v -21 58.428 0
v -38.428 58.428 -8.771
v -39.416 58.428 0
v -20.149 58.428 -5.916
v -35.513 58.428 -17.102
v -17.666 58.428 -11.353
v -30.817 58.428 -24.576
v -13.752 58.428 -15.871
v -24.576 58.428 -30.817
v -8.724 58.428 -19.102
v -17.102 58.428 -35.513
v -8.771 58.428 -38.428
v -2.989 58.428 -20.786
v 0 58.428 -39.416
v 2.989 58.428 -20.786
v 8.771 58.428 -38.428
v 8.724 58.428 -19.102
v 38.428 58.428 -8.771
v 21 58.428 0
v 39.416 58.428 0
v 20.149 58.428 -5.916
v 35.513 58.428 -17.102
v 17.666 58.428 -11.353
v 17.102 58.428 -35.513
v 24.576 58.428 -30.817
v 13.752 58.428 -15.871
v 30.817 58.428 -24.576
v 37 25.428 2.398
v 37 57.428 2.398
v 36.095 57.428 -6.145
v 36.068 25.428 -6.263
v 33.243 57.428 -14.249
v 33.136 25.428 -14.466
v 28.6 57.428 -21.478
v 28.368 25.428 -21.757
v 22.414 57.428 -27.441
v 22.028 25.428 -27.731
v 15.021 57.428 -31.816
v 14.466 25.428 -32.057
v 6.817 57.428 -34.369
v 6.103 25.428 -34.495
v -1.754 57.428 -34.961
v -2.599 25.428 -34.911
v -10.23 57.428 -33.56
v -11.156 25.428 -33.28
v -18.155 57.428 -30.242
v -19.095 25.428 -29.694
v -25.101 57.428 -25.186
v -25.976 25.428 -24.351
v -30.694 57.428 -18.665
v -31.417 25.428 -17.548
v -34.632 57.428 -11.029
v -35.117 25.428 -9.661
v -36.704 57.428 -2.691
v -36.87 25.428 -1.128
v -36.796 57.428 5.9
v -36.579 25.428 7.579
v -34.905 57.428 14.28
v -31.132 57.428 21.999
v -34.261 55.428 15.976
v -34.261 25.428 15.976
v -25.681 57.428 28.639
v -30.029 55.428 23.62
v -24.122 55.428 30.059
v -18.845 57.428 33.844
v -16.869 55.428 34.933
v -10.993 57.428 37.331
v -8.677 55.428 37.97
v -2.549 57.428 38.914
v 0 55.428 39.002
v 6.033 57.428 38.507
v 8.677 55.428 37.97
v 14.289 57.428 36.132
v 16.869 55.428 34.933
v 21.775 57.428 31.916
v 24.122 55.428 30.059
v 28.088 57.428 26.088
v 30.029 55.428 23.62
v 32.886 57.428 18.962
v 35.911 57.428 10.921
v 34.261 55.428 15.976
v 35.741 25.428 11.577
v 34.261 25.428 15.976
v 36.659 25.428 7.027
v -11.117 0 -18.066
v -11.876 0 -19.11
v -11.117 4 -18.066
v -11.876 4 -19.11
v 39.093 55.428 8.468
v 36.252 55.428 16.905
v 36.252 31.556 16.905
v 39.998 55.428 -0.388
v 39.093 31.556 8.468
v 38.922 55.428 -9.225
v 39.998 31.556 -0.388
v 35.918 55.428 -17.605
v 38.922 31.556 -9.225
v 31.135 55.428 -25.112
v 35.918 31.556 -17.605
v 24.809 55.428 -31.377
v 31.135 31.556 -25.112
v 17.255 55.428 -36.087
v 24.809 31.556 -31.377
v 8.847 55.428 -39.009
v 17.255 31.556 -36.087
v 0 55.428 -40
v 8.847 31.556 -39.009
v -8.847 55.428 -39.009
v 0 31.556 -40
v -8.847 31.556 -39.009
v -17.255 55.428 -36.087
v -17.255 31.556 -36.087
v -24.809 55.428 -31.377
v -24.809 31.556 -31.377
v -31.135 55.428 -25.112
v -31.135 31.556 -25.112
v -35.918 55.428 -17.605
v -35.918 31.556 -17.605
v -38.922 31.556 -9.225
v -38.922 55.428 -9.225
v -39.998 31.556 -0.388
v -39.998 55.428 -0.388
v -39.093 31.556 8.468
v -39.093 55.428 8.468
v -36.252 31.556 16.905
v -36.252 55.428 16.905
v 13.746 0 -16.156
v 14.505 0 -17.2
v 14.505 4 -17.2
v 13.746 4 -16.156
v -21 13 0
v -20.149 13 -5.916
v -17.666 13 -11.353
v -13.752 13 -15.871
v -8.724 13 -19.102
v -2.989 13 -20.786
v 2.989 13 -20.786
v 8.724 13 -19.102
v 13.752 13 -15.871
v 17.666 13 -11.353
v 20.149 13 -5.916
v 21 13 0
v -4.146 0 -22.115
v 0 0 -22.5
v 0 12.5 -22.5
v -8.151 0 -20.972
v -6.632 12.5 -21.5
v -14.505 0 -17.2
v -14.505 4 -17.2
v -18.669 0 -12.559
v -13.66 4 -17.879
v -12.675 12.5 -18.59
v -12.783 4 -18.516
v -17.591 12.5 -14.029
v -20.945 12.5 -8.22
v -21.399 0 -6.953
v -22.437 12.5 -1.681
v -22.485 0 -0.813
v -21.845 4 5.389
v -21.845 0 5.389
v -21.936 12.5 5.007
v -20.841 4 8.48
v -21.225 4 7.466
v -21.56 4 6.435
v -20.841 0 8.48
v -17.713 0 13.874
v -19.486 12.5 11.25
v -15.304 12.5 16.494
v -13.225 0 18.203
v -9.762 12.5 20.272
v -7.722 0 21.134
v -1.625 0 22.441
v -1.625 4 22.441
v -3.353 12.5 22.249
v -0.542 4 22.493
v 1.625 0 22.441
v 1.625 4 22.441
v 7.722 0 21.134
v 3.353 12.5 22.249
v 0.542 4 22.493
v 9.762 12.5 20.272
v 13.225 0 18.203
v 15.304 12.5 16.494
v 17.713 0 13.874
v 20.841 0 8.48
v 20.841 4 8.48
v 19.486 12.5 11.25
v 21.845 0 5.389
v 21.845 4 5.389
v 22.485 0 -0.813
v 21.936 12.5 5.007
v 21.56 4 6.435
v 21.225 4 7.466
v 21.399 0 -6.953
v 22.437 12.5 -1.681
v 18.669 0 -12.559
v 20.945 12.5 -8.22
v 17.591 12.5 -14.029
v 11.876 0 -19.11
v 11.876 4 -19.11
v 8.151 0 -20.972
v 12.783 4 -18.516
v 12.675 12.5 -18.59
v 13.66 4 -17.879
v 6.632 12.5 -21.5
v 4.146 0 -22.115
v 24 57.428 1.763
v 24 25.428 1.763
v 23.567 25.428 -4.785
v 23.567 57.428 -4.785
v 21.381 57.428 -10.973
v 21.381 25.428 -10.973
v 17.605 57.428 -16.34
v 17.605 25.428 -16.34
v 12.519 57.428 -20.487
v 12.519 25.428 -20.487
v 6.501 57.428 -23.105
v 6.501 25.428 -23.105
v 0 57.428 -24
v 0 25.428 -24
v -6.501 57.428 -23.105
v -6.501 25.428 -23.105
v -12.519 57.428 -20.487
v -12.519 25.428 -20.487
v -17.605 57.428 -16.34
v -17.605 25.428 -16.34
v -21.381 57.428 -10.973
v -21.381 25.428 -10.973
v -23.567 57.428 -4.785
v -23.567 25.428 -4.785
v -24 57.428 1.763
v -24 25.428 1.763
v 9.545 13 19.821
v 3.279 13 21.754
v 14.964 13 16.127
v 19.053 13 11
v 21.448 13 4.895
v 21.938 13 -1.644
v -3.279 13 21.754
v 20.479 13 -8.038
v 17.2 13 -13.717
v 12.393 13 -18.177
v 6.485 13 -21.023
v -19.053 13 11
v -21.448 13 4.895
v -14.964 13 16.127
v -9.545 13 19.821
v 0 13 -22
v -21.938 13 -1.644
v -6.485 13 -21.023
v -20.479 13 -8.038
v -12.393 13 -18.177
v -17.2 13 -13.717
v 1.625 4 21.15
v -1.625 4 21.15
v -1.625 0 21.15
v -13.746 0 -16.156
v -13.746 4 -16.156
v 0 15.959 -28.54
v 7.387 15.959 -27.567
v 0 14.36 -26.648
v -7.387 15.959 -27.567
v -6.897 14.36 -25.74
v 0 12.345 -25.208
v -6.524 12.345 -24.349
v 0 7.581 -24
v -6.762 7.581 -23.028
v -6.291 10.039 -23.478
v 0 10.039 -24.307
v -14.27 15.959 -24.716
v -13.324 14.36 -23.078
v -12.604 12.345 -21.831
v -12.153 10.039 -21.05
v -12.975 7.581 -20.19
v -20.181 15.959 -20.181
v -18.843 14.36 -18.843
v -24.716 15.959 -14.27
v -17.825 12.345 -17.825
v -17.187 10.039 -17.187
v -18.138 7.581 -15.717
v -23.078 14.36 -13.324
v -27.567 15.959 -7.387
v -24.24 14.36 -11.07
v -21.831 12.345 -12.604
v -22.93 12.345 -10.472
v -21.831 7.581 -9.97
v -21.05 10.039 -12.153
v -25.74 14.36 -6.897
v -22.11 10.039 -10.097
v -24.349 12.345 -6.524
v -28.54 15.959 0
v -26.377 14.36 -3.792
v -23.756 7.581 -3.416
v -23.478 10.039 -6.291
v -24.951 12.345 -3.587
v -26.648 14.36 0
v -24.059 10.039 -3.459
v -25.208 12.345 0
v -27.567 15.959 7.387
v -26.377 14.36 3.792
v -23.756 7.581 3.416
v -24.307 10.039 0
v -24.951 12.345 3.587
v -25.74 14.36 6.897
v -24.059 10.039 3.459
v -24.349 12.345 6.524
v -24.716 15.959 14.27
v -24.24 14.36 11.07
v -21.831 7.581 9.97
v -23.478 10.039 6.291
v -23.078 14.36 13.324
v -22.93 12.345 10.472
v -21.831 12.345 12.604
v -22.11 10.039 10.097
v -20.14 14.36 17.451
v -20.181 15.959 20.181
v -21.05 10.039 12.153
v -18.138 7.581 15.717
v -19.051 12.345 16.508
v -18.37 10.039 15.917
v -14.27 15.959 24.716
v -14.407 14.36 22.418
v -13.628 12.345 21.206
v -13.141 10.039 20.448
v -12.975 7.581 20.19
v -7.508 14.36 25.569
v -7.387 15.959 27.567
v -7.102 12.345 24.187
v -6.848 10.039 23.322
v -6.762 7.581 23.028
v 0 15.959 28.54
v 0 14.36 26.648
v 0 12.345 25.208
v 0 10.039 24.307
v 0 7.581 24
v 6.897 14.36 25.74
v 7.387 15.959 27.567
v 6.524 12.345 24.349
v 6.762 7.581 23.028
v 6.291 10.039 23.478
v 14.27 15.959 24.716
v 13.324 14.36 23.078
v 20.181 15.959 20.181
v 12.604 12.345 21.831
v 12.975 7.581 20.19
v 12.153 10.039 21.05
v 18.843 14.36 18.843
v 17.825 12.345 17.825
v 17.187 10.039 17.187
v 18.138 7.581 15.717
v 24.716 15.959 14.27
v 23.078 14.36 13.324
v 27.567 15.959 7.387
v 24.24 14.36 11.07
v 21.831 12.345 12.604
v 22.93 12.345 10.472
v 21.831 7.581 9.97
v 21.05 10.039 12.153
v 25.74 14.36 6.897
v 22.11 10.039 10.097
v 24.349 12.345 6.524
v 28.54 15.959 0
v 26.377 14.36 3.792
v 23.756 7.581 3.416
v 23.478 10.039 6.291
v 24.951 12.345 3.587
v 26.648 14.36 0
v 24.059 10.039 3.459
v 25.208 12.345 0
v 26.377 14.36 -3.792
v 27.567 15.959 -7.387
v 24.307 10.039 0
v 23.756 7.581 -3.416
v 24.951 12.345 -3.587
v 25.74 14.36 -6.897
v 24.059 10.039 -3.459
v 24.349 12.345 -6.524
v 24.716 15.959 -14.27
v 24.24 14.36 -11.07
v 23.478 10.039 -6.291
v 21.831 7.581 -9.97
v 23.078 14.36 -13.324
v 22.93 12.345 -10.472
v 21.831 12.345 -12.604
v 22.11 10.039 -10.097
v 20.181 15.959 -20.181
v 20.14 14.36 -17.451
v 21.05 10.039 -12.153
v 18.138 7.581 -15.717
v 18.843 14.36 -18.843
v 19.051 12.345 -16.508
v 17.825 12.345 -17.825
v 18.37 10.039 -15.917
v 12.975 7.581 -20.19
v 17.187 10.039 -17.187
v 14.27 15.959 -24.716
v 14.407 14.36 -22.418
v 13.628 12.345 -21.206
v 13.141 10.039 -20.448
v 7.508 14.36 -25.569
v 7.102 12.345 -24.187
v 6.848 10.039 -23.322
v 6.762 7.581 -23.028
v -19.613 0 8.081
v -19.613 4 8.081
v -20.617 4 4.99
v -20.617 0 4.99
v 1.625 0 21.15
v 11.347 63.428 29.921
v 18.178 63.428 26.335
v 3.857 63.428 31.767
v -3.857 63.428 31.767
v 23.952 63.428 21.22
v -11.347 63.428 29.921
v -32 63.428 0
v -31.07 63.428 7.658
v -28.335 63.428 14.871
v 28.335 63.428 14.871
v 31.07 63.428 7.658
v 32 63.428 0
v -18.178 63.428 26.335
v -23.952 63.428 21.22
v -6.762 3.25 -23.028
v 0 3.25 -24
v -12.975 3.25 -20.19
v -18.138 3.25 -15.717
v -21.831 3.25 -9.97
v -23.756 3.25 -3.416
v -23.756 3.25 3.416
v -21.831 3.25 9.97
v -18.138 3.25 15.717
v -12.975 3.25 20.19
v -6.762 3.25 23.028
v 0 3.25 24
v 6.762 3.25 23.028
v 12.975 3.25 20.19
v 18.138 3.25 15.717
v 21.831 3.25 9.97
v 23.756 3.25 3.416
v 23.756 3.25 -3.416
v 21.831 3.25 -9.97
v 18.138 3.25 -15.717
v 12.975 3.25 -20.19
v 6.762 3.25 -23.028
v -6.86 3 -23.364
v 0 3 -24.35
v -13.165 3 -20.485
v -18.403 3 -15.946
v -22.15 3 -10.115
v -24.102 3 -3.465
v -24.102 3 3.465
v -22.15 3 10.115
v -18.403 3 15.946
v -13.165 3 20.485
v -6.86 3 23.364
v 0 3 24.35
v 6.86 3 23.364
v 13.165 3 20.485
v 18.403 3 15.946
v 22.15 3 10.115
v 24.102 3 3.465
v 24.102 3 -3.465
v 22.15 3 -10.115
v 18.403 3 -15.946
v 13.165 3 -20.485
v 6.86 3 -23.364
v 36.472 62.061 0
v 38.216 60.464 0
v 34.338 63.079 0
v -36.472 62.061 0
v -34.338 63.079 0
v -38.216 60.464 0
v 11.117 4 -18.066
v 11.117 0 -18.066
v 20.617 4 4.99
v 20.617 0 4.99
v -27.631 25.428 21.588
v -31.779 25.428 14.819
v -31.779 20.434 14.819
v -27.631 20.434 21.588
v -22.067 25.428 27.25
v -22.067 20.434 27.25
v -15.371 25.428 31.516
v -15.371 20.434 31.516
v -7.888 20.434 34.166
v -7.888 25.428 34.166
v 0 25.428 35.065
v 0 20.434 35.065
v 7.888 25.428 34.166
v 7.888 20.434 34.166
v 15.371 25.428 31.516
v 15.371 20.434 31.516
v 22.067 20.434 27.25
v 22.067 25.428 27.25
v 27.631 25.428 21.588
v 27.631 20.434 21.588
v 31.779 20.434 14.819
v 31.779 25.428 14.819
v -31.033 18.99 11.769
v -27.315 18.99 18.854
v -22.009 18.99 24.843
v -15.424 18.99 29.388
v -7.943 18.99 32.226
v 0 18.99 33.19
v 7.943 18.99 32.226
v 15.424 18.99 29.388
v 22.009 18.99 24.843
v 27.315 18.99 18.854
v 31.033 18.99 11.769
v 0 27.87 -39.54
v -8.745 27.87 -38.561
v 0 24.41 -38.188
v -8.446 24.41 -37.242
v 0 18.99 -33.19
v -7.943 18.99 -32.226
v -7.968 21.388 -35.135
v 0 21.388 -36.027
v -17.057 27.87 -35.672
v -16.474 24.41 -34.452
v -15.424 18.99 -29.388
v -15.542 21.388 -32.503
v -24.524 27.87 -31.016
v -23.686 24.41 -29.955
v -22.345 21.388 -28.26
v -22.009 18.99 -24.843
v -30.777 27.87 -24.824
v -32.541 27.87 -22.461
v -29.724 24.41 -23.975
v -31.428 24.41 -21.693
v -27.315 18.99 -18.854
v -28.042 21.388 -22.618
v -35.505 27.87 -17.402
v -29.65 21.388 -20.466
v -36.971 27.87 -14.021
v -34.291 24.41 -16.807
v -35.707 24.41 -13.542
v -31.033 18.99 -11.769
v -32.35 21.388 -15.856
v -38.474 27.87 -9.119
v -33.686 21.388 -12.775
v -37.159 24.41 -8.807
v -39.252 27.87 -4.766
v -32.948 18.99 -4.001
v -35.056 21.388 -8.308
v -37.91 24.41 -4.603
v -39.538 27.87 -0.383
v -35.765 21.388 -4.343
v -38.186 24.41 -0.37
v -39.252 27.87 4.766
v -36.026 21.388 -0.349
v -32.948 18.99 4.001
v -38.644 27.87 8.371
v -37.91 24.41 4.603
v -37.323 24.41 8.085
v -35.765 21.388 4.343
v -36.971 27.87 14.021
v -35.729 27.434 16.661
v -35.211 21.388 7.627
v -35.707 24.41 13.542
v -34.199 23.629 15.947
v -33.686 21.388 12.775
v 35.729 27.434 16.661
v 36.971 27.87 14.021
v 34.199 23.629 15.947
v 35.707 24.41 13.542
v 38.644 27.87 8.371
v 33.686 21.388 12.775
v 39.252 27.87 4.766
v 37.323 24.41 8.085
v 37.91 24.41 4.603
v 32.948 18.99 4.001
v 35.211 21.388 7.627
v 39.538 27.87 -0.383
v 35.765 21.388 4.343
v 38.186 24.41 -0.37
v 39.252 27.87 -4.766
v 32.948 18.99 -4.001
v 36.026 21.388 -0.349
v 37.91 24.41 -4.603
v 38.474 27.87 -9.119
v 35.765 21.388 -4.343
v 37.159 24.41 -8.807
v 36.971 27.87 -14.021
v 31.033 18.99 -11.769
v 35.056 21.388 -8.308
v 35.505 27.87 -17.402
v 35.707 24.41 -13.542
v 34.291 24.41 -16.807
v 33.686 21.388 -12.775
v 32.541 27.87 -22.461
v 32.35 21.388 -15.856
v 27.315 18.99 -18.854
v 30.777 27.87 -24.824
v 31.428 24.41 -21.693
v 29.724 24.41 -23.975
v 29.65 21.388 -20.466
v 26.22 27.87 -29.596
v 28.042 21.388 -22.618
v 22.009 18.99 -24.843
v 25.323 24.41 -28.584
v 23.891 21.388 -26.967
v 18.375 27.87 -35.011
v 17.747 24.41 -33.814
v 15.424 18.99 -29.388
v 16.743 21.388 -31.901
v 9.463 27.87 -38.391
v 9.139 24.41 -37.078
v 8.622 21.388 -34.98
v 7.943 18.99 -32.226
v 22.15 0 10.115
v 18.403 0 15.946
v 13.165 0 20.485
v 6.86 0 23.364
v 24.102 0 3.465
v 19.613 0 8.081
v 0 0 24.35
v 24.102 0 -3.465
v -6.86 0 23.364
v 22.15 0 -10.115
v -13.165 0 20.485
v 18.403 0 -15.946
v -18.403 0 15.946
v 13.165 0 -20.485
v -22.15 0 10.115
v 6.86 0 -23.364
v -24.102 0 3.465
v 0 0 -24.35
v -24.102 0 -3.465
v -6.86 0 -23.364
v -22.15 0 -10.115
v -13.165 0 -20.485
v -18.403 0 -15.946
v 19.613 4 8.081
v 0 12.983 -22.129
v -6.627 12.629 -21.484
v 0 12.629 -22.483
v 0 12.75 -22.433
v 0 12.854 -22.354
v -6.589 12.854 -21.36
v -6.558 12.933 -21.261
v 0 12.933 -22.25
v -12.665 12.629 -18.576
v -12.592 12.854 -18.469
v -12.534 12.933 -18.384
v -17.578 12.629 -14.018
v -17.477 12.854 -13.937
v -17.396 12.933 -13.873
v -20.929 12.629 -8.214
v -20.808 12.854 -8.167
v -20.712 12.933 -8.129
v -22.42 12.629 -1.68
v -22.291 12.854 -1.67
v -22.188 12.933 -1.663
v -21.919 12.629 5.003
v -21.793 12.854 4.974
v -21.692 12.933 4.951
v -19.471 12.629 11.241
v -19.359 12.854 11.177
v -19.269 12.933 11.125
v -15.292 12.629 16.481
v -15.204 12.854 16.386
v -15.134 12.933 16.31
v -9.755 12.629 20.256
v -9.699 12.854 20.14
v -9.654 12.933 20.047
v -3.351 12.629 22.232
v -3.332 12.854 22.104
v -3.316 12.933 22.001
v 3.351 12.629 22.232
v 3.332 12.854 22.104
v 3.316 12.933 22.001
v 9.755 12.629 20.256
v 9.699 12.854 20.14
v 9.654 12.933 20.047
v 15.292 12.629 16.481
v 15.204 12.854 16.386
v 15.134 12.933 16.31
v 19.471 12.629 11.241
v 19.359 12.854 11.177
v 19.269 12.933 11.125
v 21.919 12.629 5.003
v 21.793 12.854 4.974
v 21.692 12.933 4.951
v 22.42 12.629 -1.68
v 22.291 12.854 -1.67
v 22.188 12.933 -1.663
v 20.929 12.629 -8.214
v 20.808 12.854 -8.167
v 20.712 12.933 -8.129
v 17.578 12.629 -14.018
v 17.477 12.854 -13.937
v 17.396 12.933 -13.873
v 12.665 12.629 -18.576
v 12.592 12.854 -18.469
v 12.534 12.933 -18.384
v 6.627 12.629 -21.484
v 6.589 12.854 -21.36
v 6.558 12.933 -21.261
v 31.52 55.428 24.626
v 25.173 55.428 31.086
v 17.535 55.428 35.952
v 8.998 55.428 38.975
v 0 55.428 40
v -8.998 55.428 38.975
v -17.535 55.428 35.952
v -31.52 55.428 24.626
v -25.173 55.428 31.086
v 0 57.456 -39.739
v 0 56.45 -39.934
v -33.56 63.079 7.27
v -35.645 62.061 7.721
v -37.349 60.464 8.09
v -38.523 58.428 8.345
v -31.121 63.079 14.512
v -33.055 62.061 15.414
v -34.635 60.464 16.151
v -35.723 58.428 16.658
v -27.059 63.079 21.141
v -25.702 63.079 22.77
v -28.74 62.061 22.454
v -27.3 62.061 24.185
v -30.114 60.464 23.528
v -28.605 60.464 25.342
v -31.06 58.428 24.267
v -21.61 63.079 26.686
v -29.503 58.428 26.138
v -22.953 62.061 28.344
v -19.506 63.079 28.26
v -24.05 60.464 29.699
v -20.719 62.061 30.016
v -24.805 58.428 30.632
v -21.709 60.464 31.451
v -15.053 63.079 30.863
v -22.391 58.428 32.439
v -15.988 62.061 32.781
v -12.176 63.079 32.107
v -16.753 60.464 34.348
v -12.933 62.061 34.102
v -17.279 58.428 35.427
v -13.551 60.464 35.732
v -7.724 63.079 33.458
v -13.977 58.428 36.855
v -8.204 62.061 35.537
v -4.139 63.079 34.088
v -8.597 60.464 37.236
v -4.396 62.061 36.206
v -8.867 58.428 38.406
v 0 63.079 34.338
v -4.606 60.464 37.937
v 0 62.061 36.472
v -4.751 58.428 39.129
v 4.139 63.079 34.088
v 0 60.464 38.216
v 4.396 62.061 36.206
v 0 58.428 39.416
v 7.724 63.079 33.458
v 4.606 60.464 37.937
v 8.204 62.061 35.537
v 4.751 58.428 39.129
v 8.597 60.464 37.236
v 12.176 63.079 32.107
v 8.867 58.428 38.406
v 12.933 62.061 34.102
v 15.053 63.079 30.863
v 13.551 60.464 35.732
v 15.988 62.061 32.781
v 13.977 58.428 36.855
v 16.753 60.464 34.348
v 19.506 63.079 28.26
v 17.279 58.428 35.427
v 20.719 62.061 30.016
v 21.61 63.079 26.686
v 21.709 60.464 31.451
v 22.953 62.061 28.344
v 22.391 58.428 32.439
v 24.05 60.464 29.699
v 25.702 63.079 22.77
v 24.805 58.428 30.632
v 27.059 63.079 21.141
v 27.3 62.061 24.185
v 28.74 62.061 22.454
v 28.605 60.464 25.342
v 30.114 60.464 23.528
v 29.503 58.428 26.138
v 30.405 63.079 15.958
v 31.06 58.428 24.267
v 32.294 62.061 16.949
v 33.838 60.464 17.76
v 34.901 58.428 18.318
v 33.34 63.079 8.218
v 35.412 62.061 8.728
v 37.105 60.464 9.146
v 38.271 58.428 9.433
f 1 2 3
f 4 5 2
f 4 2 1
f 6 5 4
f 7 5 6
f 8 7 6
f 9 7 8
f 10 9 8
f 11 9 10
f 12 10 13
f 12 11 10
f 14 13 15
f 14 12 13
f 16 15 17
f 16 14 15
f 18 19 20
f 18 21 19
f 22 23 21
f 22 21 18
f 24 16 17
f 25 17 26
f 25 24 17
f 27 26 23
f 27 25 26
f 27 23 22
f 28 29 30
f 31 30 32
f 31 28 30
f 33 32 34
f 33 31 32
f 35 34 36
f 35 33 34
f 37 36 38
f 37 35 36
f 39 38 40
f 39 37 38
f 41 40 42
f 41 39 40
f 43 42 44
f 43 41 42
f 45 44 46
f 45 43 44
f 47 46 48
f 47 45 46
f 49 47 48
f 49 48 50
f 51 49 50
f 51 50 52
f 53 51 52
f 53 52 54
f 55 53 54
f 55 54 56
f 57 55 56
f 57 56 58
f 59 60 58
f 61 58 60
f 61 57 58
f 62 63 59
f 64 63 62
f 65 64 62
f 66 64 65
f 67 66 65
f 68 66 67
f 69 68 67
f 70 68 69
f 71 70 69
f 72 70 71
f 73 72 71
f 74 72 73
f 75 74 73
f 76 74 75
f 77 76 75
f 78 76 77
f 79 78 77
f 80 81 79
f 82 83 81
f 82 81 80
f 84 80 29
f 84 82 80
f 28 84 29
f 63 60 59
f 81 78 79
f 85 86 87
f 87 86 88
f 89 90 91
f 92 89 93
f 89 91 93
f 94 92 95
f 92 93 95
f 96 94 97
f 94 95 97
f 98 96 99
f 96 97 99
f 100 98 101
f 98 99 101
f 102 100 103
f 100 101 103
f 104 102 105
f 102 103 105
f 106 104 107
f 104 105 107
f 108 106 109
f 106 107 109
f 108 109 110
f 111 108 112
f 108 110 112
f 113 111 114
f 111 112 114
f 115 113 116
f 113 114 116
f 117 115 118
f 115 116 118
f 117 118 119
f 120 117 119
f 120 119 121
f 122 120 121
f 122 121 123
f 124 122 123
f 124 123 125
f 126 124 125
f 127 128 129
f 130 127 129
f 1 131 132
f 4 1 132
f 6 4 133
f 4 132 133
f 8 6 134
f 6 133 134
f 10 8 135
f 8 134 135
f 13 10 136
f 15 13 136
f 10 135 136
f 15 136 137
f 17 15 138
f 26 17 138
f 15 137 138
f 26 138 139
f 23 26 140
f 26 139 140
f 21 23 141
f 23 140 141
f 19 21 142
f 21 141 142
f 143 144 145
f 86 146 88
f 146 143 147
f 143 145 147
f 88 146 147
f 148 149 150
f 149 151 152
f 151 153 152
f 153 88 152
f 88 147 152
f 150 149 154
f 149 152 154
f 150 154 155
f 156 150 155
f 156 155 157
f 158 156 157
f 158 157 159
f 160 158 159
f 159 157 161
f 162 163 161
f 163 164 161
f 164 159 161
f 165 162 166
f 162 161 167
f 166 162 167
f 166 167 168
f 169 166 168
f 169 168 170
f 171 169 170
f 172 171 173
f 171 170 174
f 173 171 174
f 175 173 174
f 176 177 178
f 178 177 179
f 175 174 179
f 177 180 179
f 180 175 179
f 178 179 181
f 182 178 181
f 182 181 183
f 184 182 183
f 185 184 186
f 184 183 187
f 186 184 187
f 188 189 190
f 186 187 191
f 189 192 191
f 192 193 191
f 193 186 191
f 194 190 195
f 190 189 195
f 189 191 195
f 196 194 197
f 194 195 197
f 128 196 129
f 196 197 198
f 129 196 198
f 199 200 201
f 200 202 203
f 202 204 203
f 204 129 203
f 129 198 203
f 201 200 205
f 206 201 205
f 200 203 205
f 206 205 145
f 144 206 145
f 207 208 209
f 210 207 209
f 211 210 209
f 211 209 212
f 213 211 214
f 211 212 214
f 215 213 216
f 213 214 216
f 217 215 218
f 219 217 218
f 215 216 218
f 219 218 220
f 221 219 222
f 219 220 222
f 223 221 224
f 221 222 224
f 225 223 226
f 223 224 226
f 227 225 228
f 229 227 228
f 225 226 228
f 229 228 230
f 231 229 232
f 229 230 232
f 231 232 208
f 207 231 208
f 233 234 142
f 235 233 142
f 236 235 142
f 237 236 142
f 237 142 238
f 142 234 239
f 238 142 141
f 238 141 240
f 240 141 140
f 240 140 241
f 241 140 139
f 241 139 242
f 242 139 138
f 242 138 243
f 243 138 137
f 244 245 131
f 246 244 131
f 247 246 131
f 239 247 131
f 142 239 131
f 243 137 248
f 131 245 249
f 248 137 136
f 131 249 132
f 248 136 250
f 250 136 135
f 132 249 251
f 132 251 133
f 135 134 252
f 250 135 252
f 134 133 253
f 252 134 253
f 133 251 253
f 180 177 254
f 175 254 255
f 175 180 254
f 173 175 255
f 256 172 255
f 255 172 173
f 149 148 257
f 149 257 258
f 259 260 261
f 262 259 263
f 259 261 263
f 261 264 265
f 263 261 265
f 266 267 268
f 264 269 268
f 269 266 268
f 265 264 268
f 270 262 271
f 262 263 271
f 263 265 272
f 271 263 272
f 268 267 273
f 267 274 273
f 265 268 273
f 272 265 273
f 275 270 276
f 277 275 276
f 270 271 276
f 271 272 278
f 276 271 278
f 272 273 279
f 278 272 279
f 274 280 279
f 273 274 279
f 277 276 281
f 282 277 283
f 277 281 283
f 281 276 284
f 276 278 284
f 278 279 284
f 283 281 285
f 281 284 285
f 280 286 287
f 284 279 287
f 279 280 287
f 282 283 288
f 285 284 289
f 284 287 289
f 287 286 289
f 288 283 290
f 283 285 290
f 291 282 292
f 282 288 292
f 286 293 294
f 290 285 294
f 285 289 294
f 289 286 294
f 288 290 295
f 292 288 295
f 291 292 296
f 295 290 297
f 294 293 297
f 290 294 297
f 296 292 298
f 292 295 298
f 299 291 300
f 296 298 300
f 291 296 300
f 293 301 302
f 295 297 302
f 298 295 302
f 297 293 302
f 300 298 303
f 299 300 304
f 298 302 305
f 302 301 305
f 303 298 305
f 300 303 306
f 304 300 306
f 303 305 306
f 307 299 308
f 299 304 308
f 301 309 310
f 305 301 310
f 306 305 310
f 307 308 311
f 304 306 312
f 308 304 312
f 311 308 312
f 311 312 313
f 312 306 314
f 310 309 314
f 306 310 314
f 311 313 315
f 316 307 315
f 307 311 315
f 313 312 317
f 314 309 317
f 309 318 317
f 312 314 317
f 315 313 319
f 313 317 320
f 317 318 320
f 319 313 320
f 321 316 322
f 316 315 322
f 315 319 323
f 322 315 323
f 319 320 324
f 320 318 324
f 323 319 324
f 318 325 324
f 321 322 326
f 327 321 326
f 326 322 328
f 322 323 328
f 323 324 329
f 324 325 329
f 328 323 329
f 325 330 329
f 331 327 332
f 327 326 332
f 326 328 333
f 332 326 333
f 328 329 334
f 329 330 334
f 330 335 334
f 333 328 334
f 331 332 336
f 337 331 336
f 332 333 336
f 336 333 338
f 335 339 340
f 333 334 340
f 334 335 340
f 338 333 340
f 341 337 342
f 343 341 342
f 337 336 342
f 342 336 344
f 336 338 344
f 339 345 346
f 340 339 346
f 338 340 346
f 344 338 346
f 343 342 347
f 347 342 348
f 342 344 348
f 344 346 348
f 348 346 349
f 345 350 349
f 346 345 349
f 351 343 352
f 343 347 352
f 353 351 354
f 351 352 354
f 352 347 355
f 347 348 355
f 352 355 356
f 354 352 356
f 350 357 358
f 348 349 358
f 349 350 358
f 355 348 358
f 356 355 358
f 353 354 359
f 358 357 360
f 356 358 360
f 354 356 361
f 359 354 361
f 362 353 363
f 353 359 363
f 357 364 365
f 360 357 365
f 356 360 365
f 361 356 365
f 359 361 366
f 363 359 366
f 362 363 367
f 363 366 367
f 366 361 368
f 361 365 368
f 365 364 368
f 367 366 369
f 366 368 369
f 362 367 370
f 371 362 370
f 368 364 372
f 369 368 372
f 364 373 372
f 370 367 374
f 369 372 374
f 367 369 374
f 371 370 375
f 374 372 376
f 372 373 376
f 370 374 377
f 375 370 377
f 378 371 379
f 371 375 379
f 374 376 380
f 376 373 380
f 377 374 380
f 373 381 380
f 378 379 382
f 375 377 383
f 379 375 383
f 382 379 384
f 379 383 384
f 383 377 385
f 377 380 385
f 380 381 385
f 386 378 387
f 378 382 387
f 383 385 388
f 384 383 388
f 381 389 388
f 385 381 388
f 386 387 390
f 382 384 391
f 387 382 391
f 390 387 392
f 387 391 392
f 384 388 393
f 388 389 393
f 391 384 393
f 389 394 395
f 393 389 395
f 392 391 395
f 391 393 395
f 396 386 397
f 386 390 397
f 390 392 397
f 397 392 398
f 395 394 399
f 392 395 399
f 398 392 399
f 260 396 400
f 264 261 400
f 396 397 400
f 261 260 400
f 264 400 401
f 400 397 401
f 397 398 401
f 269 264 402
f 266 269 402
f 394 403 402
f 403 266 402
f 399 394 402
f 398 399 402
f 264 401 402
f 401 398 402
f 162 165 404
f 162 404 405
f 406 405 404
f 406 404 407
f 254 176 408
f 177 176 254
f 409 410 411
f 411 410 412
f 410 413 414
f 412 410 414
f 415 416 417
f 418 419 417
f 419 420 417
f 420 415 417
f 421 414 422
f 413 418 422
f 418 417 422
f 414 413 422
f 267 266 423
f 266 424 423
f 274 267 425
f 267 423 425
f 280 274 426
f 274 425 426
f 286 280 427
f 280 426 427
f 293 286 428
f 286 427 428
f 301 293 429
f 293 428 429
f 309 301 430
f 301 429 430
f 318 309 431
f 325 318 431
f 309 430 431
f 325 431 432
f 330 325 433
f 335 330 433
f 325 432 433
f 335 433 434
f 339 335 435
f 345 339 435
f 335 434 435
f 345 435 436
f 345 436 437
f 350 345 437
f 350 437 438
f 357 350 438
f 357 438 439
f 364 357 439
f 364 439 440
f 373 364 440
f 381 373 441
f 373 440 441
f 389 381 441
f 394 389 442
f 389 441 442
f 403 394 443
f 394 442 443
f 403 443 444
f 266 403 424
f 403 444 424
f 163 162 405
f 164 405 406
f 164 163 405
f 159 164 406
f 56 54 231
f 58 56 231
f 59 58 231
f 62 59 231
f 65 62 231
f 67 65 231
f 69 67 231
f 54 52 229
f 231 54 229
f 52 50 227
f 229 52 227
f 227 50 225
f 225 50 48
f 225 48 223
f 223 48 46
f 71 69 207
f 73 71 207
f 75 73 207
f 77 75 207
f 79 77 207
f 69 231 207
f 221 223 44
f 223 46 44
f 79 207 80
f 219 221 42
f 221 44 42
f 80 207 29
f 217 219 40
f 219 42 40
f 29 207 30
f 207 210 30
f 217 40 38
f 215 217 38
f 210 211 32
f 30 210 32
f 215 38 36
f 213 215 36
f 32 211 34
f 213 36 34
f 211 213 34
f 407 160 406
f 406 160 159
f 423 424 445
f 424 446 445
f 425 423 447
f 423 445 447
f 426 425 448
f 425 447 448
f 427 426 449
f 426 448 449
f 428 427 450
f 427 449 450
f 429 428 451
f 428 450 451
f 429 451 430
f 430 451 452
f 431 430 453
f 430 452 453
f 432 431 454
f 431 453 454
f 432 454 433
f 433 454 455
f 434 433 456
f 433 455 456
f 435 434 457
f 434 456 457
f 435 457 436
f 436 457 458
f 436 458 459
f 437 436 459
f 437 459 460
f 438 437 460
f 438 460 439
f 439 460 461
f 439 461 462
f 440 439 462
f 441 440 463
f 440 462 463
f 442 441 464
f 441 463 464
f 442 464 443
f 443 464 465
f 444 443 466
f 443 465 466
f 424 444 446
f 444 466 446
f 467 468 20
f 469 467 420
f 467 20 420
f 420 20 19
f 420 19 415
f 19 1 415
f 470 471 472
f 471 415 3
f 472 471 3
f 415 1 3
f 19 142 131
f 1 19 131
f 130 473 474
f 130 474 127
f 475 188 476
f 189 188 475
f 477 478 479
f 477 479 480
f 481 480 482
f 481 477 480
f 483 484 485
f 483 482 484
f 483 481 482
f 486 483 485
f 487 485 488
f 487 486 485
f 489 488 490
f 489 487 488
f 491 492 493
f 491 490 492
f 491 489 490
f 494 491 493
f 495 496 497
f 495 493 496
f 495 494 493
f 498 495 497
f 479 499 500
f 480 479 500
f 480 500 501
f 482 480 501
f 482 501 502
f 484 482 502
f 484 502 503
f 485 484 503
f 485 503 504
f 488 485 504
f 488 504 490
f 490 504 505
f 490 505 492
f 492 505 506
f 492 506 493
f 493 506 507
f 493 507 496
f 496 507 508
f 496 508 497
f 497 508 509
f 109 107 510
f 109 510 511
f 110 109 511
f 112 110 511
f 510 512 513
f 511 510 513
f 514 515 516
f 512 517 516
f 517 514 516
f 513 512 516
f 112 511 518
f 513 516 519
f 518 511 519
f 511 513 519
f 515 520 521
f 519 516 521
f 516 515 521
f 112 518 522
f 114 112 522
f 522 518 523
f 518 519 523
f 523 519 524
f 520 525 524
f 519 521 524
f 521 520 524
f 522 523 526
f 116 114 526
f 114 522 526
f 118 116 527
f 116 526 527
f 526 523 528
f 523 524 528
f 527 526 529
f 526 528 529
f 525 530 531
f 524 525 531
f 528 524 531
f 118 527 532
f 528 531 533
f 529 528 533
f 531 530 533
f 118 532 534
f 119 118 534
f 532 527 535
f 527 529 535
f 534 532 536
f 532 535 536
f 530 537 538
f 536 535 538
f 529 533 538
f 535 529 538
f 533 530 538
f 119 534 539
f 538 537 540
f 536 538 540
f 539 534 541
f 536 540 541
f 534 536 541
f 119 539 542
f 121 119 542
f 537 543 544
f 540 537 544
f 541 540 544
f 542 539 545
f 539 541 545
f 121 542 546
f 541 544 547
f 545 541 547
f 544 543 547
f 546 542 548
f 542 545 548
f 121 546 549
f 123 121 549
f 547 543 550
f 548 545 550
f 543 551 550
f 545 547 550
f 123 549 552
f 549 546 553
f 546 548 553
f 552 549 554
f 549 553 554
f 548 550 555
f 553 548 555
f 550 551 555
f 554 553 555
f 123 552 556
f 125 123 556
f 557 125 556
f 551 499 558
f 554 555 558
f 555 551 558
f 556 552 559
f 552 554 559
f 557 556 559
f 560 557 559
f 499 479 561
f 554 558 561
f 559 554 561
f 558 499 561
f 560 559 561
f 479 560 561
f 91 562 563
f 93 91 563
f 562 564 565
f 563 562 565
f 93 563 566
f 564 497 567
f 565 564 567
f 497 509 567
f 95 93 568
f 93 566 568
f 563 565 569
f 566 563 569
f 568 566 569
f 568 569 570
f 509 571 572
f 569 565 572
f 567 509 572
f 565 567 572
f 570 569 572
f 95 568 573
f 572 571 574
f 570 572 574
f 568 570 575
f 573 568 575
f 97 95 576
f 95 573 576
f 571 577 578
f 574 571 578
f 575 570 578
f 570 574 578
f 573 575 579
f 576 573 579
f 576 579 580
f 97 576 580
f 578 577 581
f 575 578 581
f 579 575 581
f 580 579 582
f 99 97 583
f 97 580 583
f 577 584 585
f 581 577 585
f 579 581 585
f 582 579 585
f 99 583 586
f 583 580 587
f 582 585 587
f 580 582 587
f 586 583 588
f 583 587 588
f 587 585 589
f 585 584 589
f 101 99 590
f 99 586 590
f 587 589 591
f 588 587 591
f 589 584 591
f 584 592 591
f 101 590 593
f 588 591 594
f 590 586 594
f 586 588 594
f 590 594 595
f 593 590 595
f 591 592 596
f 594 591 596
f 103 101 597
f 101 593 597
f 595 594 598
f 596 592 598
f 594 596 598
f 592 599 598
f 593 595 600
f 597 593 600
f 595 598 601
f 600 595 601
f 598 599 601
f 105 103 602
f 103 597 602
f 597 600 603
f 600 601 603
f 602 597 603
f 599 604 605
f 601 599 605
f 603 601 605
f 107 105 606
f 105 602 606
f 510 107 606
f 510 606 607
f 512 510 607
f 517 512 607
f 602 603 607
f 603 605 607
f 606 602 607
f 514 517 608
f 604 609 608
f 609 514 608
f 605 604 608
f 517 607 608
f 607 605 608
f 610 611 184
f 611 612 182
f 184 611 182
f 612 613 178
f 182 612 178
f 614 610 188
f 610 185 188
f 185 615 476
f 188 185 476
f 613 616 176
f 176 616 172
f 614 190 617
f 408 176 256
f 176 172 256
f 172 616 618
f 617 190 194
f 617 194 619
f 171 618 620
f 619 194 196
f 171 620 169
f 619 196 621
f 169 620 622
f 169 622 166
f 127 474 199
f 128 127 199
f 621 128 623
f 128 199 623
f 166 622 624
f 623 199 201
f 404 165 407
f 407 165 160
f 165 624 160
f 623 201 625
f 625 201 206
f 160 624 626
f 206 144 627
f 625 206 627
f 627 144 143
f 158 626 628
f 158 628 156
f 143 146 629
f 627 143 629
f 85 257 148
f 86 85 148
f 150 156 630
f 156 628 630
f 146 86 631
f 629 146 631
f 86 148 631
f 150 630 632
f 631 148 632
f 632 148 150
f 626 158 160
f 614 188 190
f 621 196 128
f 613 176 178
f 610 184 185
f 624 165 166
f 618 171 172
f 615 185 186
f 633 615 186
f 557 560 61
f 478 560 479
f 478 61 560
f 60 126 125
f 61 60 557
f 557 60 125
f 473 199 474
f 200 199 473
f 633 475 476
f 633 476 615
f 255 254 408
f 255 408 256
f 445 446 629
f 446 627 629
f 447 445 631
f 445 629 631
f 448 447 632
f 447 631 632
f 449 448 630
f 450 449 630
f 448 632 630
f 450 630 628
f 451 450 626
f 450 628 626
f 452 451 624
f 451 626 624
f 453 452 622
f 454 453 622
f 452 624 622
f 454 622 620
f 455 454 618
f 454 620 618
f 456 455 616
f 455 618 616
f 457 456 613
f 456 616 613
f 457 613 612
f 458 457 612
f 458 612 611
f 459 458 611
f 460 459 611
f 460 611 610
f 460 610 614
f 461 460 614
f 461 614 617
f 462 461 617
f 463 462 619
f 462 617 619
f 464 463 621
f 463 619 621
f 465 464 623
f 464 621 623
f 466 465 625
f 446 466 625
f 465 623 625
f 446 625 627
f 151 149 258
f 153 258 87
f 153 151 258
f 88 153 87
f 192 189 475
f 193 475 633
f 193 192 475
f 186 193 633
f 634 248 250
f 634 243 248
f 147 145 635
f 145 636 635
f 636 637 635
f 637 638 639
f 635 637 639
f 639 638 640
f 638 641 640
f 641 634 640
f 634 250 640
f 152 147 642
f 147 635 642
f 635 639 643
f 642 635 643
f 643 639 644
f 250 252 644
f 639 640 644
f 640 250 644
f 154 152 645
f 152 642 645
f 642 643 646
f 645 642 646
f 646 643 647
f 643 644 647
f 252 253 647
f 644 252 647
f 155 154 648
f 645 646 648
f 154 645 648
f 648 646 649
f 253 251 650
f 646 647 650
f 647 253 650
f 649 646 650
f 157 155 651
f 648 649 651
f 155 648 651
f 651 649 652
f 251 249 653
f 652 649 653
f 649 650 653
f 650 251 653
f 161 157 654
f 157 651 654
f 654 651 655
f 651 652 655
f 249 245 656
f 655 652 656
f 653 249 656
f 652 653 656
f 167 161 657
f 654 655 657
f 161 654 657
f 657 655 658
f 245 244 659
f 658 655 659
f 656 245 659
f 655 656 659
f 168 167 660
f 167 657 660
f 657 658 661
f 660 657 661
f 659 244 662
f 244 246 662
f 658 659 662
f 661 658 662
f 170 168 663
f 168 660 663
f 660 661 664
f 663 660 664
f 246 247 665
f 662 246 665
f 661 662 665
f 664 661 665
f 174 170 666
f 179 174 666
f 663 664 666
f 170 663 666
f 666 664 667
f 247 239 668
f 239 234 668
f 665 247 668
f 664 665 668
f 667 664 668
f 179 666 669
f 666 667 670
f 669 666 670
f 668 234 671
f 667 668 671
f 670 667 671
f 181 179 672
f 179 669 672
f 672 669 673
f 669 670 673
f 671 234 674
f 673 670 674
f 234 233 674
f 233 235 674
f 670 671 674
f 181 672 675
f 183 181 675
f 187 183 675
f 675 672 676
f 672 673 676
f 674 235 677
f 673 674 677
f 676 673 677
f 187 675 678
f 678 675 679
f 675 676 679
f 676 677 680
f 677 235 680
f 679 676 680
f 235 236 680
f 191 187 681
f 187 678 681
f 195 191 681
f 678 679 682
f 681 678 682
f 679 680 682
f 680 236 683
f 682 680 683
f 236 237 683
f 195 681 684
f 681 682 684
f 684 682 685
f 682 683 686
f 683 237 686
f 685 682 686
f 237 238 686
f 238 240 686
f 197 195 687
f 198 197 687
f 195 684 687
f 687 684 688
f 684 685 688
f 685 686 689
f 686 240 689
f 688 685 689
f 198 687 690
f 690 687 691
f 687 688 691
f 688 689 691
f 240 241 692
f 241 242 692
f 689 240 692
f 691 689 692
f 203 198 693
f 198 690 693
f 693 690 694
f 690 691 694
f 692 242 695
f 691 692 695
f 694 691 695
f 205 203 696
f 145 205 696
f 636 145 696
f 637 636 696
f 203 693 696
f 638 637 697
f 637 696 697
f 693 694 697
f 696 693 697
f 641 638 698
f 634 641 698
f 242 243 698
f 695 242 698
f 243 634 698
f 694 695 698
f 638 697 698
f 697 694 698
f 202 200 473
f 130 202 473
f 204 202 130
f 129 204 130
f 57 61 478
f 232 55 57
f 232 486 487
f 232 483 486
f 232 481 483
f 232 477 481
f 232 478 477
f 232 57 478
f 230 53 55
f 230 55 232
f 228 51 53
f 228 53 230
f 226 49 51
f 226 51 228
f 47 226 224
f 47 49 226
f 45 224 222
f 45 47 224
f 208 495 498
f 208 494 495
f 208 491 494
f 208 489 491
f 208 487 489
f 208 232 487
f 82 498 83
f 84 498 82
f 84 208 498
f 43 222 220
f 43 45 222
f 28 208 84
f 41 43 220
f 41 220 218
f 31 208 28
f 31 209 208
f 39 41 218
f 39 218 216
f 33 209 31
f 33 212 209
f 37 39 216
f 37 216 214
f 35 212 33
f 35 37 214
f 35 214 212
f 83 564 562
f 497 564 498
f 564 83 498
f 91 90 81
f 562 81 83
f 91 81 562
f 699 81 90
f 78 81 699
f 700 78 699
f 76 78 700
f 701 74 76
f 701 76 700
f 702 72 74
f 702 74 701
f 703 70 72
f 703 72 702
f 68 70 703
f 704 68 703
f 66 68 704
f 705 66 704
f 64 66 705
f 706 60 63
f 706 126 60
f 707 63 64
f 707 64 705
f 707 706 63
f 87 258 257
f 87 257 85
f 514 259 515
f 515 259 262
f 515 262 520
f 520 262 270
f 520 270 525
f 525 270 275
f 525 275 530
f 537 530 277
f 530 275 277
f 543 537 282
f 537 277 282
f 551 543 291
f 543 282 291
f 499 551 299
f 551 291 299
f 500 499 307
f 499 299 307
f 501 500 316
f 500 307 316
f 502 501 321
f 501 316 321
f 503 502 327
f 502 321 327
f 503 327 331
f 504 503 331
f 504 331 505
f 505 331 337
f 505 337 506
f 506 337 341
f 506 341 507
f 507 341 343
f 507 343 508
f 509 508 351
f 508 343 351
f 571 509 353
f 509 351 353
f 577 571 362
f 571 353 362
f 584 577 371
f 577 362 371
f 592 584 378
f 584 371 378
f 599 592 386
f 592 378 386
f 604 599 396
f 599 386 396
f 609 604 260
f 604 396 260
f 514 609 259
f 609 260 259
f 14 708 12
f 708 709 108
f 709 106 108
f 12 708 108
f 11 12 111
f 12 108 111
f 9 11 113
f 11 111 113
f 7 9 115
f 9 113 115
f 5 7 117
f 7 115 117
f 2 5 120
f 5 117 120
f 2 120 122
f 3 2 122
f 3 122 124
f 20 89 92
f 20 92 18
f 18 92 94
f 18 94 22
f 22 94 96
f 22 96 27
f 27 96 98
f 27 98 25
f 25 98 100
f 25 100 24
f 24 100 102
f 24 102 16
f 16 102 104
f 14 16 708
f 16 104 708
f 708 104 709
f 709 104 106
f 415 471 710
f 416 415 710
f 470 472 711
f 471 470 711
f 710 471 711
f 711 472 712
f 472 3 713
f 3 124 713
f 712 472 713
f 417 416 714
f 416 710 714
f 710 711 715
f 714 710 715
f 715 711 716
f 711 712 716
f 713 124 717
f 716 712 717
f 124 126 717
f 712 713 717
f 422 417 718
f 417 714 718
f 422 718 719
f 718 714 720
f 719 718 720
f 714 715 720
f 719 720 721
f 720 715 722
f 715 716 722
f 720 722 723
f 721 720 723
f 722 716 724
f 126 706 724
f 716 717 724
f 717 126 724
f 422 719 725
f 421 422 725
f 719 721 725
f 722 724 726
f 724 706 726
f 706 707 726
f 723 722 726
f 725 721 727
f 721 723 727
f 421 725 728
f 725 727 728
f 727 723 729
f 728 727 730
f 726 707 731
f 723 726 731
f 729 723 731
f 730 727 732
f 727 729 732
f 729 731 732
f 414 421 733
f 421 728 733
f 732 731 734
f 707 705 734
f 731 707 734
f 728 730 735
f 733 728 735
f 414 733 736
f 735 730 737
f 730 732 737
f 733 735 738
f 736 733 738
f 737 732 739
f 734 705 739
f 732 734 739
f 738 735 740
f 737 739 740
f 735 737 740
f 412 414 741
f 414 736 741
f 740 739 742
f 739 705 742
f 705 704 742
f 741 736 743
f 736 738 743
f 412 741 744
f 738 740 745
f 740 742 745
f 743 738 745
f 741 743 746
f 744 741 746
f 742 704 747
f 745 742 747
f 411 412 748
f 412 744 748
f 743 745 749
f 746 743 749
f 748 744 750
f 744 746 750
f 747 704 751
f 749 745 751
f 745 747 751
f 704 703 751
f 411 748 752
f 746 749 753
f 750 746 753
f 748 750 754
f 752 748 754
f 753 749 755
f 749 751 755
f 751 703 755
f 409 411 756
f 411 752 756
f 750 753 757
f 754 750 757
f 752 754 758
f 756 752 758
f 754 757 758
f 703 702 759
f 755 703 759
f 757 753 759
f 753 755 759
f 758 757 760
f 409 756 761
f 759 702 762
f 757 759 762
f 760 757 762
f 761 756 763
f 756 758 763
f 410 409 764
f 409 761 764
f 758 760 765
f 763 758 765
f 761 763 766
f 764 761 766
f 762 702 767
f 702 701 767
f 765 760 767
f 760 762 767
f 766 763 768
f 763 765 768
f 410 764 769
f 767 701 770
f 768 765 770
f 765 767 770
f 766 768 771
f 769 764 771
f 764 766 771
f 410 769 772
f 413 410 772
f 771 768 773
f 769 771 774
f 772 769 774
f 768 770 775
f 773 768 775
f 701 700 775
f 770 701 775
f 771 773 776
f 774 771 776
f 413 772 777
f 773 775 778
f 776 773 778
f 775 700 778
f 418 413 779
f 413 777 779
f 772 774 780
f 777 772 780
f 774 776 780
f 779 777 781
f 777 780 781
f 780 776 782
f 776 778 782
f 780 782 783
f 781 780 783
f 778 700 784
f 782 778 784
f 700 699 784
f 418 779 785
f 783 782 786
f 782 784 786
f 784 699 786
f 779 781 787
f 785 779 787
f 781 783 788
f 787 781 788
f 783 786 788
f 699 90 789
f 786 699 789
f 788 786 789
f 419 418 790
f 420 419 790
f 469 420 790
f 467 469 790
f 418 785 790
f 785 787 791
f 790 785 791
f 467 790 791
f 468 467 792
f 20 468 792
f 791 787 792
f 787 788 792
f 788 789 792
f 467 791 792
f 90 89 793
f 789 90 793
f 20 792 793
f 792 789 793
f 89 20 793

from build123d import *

# Parameters (mm, degrees)
CUT_EXTRUDE3_DEPTH           = 60
CUT_EXTRUDE5_DEPTH           = 2
CUT_EXTRUDE5_DEPTH_BACK      = 30
SKETCH19_W                   = 12
SKETCH19_H                   = 36.5
CUT_REVOLVE2_ANGLE           = 65
CUT_REVOLVE2_OTHER_WAY_ANGLE = 65
SKETCH21_W                   = 3.25
SKETCH21_H                   = 4
BOSS_EXTRUDE3_DEPTH          = 1.35
CIRPATTERN1_COUNT            = 5
CUT_EXTRUDE9_START           = -5
CUT_EXTRUDE9_DEPTH           = 5


with BuildPart() as part:
    # Sketch1 → Revolve1 (revolve)
    with BuildSketch(Plane.XY):
        with BuildLine():
            Line((0, 63.427876097), (32, 63.427876097))
            ThreePointArc((32, 63.427876097), (37.656854249, 61.084730346), (40, 55.427876097))
            Line((40, 55.427876097), (40, 31.556288966))
            ThreePointArc((40, 31.556288966), (38.188122658, 24.409721904), (33.190210564, 18.989648567))
            Line((33.190210564, 18.989648567), (28.539859624, 15.958818353))
            ThreePointArc((28.539859624, 15.958818353), (25.207918228, 12.345436129), (24, 7.581058088))
            Line((24, 7.581058088), (24, 3.25))
            Line((24, 3.25), (24.35, 3))
            Line((24.35, 3), (24.35, 0))
            Line((24.35, 0), (22.5, 0))
            Line((22.5, 0), (22.5, 12.5))
            ThreePointArc((22.5, 12.5), (22.353553391, 12.853553391), (22, 13))
            Line((22, 13), (0, 13))
            Line((0, 13), (0, 63.427876097))
        make_face()
    revolve(axis=Axis((0, 0, 0), (0, 1, 0)))

    # Sketch11 → Cut-Extrude3 (cut)
    with BuildSketch(Plane(origin=(0, 13, 0), x_dir=(-1, 0, 0), z_dir=(0, -1, 0))):
        with BuildLine():
            Line((-21, 0), (21, 0))
            ThreePointArc((21, 0), (0, 21), (-21, 0))
        make_face()
    extrude(amount=-CUT_EXTRUDE3_DEPTH, mode=Mode.SUBTRACT)

    # Sketch9 → Cut-Extrude5 (cut, two sides: drawn at the far end of the back side and taken through both)
    with BuildSketch(Plane(origin=(0, 55.427876097, 0), x_dir=(1, 0, 0), z_dir=(0, 1, 0)).offset(-CUT_EXTRUDE5_DEPTH_BACK)):
        with BuildLine():
            ThreePointArc((-37, -1.601545046), (-0.398454954, -39), (37, -2.398454954))
            ThreePointArc((37, -2.398454954), (0.398454954, 35), (-37, -1.601545046))
        make_face()
        with BuildLine():
            Line((-24, -1.763080838), (24, -1.763080838))
            ThreePointArc((24, -1.763080838), (0, 24), (-24, -1.763080838))
        make_face(mode=Mode.SUBTRACT)
    extrude(amount=CUT_EXTRUDE5_DEPTH + CUT_EXTRUDE5_DEPTH_BACK, mode=Mode.SUBTRACT)

    # Sketch19 → Cut-Revolve2 (revolve, cut)
    with BuildSketch(Plane(origin=(0, 0, 0), x_dir=(0, 0, -1), z_dir=(1, 0, 0))):
        with Locations((-41.064715832, 37.177876097)):
            Rectangle(SKETCH19_W, SKETCH19_H)
    revolve(axis=Axis((0, 0, 0), (0, 1, 0)), revolution_arc=CUT_REVOLVE2_ANGLE, mode=Mode.SUBTRACT)

    # Sketch19 → Cut-Revolve2 other way (revolve, cut)
    with BuildSketch(Plane(origin=(0, 0, 0), x_dir=(0, 0, -1), z_dir=(1, 0, 0))):
        with Locations((-41.064715832, 37.177876097)):
            Rectangle(SKETCH19_W, SKETCH19_H)
    revolve(axis=Axis((0, 0, 0), (0, -1, 0)), revolution_arc=CUT_REVOLVE2_OTHER_WAY_ANGLE, mode=Mode.SUBTRACT)

    # Sketch21 → Boss-Extrude3 (add)
    with BuildSketch(Plane(origin=(0, 0, 22.5), x_dir=(-1, 0, 0), z_dir=(0, 0, -1))):
        with Locations((0, 2)):
            Rectangle(SKETCH21_W, SKETCH21_H)
    boss_extrude3 = extrude(amount=BOSS_EXTRUDE3_DEPTH)

    # CirPattern1: Boss-Extrude3 ×5 about axis
    cirpattern1_axis = Axis((0, 0, 0), (0, -1, 0))
    for i in range(1, CIRPATTERN1_COUNT):
        add(boss_extrude3.rotate(cirpattern1_axis, i * 360 / CIRPATTERN1_COUNT))

    # Sketch22 → Cut-Extrude9 (cut)
    with BuildSketch(Plane(origin=(0, 63.427876097, 0), x_dir=(1, 0, 0), z_dir=(0, 1, 0)).offset(CUT_EXTRUDE9_START)):
        with BuildLine():
            Line((-40, 0), (40, 0))
            ThreePointArc((40, 0), (0, 40), (-40, 0))
        make_face()
    extrude(amount=CUT_EXTRUDE9_DEPTH, mode=Mode.SUBTRACT)


solid = part.part
